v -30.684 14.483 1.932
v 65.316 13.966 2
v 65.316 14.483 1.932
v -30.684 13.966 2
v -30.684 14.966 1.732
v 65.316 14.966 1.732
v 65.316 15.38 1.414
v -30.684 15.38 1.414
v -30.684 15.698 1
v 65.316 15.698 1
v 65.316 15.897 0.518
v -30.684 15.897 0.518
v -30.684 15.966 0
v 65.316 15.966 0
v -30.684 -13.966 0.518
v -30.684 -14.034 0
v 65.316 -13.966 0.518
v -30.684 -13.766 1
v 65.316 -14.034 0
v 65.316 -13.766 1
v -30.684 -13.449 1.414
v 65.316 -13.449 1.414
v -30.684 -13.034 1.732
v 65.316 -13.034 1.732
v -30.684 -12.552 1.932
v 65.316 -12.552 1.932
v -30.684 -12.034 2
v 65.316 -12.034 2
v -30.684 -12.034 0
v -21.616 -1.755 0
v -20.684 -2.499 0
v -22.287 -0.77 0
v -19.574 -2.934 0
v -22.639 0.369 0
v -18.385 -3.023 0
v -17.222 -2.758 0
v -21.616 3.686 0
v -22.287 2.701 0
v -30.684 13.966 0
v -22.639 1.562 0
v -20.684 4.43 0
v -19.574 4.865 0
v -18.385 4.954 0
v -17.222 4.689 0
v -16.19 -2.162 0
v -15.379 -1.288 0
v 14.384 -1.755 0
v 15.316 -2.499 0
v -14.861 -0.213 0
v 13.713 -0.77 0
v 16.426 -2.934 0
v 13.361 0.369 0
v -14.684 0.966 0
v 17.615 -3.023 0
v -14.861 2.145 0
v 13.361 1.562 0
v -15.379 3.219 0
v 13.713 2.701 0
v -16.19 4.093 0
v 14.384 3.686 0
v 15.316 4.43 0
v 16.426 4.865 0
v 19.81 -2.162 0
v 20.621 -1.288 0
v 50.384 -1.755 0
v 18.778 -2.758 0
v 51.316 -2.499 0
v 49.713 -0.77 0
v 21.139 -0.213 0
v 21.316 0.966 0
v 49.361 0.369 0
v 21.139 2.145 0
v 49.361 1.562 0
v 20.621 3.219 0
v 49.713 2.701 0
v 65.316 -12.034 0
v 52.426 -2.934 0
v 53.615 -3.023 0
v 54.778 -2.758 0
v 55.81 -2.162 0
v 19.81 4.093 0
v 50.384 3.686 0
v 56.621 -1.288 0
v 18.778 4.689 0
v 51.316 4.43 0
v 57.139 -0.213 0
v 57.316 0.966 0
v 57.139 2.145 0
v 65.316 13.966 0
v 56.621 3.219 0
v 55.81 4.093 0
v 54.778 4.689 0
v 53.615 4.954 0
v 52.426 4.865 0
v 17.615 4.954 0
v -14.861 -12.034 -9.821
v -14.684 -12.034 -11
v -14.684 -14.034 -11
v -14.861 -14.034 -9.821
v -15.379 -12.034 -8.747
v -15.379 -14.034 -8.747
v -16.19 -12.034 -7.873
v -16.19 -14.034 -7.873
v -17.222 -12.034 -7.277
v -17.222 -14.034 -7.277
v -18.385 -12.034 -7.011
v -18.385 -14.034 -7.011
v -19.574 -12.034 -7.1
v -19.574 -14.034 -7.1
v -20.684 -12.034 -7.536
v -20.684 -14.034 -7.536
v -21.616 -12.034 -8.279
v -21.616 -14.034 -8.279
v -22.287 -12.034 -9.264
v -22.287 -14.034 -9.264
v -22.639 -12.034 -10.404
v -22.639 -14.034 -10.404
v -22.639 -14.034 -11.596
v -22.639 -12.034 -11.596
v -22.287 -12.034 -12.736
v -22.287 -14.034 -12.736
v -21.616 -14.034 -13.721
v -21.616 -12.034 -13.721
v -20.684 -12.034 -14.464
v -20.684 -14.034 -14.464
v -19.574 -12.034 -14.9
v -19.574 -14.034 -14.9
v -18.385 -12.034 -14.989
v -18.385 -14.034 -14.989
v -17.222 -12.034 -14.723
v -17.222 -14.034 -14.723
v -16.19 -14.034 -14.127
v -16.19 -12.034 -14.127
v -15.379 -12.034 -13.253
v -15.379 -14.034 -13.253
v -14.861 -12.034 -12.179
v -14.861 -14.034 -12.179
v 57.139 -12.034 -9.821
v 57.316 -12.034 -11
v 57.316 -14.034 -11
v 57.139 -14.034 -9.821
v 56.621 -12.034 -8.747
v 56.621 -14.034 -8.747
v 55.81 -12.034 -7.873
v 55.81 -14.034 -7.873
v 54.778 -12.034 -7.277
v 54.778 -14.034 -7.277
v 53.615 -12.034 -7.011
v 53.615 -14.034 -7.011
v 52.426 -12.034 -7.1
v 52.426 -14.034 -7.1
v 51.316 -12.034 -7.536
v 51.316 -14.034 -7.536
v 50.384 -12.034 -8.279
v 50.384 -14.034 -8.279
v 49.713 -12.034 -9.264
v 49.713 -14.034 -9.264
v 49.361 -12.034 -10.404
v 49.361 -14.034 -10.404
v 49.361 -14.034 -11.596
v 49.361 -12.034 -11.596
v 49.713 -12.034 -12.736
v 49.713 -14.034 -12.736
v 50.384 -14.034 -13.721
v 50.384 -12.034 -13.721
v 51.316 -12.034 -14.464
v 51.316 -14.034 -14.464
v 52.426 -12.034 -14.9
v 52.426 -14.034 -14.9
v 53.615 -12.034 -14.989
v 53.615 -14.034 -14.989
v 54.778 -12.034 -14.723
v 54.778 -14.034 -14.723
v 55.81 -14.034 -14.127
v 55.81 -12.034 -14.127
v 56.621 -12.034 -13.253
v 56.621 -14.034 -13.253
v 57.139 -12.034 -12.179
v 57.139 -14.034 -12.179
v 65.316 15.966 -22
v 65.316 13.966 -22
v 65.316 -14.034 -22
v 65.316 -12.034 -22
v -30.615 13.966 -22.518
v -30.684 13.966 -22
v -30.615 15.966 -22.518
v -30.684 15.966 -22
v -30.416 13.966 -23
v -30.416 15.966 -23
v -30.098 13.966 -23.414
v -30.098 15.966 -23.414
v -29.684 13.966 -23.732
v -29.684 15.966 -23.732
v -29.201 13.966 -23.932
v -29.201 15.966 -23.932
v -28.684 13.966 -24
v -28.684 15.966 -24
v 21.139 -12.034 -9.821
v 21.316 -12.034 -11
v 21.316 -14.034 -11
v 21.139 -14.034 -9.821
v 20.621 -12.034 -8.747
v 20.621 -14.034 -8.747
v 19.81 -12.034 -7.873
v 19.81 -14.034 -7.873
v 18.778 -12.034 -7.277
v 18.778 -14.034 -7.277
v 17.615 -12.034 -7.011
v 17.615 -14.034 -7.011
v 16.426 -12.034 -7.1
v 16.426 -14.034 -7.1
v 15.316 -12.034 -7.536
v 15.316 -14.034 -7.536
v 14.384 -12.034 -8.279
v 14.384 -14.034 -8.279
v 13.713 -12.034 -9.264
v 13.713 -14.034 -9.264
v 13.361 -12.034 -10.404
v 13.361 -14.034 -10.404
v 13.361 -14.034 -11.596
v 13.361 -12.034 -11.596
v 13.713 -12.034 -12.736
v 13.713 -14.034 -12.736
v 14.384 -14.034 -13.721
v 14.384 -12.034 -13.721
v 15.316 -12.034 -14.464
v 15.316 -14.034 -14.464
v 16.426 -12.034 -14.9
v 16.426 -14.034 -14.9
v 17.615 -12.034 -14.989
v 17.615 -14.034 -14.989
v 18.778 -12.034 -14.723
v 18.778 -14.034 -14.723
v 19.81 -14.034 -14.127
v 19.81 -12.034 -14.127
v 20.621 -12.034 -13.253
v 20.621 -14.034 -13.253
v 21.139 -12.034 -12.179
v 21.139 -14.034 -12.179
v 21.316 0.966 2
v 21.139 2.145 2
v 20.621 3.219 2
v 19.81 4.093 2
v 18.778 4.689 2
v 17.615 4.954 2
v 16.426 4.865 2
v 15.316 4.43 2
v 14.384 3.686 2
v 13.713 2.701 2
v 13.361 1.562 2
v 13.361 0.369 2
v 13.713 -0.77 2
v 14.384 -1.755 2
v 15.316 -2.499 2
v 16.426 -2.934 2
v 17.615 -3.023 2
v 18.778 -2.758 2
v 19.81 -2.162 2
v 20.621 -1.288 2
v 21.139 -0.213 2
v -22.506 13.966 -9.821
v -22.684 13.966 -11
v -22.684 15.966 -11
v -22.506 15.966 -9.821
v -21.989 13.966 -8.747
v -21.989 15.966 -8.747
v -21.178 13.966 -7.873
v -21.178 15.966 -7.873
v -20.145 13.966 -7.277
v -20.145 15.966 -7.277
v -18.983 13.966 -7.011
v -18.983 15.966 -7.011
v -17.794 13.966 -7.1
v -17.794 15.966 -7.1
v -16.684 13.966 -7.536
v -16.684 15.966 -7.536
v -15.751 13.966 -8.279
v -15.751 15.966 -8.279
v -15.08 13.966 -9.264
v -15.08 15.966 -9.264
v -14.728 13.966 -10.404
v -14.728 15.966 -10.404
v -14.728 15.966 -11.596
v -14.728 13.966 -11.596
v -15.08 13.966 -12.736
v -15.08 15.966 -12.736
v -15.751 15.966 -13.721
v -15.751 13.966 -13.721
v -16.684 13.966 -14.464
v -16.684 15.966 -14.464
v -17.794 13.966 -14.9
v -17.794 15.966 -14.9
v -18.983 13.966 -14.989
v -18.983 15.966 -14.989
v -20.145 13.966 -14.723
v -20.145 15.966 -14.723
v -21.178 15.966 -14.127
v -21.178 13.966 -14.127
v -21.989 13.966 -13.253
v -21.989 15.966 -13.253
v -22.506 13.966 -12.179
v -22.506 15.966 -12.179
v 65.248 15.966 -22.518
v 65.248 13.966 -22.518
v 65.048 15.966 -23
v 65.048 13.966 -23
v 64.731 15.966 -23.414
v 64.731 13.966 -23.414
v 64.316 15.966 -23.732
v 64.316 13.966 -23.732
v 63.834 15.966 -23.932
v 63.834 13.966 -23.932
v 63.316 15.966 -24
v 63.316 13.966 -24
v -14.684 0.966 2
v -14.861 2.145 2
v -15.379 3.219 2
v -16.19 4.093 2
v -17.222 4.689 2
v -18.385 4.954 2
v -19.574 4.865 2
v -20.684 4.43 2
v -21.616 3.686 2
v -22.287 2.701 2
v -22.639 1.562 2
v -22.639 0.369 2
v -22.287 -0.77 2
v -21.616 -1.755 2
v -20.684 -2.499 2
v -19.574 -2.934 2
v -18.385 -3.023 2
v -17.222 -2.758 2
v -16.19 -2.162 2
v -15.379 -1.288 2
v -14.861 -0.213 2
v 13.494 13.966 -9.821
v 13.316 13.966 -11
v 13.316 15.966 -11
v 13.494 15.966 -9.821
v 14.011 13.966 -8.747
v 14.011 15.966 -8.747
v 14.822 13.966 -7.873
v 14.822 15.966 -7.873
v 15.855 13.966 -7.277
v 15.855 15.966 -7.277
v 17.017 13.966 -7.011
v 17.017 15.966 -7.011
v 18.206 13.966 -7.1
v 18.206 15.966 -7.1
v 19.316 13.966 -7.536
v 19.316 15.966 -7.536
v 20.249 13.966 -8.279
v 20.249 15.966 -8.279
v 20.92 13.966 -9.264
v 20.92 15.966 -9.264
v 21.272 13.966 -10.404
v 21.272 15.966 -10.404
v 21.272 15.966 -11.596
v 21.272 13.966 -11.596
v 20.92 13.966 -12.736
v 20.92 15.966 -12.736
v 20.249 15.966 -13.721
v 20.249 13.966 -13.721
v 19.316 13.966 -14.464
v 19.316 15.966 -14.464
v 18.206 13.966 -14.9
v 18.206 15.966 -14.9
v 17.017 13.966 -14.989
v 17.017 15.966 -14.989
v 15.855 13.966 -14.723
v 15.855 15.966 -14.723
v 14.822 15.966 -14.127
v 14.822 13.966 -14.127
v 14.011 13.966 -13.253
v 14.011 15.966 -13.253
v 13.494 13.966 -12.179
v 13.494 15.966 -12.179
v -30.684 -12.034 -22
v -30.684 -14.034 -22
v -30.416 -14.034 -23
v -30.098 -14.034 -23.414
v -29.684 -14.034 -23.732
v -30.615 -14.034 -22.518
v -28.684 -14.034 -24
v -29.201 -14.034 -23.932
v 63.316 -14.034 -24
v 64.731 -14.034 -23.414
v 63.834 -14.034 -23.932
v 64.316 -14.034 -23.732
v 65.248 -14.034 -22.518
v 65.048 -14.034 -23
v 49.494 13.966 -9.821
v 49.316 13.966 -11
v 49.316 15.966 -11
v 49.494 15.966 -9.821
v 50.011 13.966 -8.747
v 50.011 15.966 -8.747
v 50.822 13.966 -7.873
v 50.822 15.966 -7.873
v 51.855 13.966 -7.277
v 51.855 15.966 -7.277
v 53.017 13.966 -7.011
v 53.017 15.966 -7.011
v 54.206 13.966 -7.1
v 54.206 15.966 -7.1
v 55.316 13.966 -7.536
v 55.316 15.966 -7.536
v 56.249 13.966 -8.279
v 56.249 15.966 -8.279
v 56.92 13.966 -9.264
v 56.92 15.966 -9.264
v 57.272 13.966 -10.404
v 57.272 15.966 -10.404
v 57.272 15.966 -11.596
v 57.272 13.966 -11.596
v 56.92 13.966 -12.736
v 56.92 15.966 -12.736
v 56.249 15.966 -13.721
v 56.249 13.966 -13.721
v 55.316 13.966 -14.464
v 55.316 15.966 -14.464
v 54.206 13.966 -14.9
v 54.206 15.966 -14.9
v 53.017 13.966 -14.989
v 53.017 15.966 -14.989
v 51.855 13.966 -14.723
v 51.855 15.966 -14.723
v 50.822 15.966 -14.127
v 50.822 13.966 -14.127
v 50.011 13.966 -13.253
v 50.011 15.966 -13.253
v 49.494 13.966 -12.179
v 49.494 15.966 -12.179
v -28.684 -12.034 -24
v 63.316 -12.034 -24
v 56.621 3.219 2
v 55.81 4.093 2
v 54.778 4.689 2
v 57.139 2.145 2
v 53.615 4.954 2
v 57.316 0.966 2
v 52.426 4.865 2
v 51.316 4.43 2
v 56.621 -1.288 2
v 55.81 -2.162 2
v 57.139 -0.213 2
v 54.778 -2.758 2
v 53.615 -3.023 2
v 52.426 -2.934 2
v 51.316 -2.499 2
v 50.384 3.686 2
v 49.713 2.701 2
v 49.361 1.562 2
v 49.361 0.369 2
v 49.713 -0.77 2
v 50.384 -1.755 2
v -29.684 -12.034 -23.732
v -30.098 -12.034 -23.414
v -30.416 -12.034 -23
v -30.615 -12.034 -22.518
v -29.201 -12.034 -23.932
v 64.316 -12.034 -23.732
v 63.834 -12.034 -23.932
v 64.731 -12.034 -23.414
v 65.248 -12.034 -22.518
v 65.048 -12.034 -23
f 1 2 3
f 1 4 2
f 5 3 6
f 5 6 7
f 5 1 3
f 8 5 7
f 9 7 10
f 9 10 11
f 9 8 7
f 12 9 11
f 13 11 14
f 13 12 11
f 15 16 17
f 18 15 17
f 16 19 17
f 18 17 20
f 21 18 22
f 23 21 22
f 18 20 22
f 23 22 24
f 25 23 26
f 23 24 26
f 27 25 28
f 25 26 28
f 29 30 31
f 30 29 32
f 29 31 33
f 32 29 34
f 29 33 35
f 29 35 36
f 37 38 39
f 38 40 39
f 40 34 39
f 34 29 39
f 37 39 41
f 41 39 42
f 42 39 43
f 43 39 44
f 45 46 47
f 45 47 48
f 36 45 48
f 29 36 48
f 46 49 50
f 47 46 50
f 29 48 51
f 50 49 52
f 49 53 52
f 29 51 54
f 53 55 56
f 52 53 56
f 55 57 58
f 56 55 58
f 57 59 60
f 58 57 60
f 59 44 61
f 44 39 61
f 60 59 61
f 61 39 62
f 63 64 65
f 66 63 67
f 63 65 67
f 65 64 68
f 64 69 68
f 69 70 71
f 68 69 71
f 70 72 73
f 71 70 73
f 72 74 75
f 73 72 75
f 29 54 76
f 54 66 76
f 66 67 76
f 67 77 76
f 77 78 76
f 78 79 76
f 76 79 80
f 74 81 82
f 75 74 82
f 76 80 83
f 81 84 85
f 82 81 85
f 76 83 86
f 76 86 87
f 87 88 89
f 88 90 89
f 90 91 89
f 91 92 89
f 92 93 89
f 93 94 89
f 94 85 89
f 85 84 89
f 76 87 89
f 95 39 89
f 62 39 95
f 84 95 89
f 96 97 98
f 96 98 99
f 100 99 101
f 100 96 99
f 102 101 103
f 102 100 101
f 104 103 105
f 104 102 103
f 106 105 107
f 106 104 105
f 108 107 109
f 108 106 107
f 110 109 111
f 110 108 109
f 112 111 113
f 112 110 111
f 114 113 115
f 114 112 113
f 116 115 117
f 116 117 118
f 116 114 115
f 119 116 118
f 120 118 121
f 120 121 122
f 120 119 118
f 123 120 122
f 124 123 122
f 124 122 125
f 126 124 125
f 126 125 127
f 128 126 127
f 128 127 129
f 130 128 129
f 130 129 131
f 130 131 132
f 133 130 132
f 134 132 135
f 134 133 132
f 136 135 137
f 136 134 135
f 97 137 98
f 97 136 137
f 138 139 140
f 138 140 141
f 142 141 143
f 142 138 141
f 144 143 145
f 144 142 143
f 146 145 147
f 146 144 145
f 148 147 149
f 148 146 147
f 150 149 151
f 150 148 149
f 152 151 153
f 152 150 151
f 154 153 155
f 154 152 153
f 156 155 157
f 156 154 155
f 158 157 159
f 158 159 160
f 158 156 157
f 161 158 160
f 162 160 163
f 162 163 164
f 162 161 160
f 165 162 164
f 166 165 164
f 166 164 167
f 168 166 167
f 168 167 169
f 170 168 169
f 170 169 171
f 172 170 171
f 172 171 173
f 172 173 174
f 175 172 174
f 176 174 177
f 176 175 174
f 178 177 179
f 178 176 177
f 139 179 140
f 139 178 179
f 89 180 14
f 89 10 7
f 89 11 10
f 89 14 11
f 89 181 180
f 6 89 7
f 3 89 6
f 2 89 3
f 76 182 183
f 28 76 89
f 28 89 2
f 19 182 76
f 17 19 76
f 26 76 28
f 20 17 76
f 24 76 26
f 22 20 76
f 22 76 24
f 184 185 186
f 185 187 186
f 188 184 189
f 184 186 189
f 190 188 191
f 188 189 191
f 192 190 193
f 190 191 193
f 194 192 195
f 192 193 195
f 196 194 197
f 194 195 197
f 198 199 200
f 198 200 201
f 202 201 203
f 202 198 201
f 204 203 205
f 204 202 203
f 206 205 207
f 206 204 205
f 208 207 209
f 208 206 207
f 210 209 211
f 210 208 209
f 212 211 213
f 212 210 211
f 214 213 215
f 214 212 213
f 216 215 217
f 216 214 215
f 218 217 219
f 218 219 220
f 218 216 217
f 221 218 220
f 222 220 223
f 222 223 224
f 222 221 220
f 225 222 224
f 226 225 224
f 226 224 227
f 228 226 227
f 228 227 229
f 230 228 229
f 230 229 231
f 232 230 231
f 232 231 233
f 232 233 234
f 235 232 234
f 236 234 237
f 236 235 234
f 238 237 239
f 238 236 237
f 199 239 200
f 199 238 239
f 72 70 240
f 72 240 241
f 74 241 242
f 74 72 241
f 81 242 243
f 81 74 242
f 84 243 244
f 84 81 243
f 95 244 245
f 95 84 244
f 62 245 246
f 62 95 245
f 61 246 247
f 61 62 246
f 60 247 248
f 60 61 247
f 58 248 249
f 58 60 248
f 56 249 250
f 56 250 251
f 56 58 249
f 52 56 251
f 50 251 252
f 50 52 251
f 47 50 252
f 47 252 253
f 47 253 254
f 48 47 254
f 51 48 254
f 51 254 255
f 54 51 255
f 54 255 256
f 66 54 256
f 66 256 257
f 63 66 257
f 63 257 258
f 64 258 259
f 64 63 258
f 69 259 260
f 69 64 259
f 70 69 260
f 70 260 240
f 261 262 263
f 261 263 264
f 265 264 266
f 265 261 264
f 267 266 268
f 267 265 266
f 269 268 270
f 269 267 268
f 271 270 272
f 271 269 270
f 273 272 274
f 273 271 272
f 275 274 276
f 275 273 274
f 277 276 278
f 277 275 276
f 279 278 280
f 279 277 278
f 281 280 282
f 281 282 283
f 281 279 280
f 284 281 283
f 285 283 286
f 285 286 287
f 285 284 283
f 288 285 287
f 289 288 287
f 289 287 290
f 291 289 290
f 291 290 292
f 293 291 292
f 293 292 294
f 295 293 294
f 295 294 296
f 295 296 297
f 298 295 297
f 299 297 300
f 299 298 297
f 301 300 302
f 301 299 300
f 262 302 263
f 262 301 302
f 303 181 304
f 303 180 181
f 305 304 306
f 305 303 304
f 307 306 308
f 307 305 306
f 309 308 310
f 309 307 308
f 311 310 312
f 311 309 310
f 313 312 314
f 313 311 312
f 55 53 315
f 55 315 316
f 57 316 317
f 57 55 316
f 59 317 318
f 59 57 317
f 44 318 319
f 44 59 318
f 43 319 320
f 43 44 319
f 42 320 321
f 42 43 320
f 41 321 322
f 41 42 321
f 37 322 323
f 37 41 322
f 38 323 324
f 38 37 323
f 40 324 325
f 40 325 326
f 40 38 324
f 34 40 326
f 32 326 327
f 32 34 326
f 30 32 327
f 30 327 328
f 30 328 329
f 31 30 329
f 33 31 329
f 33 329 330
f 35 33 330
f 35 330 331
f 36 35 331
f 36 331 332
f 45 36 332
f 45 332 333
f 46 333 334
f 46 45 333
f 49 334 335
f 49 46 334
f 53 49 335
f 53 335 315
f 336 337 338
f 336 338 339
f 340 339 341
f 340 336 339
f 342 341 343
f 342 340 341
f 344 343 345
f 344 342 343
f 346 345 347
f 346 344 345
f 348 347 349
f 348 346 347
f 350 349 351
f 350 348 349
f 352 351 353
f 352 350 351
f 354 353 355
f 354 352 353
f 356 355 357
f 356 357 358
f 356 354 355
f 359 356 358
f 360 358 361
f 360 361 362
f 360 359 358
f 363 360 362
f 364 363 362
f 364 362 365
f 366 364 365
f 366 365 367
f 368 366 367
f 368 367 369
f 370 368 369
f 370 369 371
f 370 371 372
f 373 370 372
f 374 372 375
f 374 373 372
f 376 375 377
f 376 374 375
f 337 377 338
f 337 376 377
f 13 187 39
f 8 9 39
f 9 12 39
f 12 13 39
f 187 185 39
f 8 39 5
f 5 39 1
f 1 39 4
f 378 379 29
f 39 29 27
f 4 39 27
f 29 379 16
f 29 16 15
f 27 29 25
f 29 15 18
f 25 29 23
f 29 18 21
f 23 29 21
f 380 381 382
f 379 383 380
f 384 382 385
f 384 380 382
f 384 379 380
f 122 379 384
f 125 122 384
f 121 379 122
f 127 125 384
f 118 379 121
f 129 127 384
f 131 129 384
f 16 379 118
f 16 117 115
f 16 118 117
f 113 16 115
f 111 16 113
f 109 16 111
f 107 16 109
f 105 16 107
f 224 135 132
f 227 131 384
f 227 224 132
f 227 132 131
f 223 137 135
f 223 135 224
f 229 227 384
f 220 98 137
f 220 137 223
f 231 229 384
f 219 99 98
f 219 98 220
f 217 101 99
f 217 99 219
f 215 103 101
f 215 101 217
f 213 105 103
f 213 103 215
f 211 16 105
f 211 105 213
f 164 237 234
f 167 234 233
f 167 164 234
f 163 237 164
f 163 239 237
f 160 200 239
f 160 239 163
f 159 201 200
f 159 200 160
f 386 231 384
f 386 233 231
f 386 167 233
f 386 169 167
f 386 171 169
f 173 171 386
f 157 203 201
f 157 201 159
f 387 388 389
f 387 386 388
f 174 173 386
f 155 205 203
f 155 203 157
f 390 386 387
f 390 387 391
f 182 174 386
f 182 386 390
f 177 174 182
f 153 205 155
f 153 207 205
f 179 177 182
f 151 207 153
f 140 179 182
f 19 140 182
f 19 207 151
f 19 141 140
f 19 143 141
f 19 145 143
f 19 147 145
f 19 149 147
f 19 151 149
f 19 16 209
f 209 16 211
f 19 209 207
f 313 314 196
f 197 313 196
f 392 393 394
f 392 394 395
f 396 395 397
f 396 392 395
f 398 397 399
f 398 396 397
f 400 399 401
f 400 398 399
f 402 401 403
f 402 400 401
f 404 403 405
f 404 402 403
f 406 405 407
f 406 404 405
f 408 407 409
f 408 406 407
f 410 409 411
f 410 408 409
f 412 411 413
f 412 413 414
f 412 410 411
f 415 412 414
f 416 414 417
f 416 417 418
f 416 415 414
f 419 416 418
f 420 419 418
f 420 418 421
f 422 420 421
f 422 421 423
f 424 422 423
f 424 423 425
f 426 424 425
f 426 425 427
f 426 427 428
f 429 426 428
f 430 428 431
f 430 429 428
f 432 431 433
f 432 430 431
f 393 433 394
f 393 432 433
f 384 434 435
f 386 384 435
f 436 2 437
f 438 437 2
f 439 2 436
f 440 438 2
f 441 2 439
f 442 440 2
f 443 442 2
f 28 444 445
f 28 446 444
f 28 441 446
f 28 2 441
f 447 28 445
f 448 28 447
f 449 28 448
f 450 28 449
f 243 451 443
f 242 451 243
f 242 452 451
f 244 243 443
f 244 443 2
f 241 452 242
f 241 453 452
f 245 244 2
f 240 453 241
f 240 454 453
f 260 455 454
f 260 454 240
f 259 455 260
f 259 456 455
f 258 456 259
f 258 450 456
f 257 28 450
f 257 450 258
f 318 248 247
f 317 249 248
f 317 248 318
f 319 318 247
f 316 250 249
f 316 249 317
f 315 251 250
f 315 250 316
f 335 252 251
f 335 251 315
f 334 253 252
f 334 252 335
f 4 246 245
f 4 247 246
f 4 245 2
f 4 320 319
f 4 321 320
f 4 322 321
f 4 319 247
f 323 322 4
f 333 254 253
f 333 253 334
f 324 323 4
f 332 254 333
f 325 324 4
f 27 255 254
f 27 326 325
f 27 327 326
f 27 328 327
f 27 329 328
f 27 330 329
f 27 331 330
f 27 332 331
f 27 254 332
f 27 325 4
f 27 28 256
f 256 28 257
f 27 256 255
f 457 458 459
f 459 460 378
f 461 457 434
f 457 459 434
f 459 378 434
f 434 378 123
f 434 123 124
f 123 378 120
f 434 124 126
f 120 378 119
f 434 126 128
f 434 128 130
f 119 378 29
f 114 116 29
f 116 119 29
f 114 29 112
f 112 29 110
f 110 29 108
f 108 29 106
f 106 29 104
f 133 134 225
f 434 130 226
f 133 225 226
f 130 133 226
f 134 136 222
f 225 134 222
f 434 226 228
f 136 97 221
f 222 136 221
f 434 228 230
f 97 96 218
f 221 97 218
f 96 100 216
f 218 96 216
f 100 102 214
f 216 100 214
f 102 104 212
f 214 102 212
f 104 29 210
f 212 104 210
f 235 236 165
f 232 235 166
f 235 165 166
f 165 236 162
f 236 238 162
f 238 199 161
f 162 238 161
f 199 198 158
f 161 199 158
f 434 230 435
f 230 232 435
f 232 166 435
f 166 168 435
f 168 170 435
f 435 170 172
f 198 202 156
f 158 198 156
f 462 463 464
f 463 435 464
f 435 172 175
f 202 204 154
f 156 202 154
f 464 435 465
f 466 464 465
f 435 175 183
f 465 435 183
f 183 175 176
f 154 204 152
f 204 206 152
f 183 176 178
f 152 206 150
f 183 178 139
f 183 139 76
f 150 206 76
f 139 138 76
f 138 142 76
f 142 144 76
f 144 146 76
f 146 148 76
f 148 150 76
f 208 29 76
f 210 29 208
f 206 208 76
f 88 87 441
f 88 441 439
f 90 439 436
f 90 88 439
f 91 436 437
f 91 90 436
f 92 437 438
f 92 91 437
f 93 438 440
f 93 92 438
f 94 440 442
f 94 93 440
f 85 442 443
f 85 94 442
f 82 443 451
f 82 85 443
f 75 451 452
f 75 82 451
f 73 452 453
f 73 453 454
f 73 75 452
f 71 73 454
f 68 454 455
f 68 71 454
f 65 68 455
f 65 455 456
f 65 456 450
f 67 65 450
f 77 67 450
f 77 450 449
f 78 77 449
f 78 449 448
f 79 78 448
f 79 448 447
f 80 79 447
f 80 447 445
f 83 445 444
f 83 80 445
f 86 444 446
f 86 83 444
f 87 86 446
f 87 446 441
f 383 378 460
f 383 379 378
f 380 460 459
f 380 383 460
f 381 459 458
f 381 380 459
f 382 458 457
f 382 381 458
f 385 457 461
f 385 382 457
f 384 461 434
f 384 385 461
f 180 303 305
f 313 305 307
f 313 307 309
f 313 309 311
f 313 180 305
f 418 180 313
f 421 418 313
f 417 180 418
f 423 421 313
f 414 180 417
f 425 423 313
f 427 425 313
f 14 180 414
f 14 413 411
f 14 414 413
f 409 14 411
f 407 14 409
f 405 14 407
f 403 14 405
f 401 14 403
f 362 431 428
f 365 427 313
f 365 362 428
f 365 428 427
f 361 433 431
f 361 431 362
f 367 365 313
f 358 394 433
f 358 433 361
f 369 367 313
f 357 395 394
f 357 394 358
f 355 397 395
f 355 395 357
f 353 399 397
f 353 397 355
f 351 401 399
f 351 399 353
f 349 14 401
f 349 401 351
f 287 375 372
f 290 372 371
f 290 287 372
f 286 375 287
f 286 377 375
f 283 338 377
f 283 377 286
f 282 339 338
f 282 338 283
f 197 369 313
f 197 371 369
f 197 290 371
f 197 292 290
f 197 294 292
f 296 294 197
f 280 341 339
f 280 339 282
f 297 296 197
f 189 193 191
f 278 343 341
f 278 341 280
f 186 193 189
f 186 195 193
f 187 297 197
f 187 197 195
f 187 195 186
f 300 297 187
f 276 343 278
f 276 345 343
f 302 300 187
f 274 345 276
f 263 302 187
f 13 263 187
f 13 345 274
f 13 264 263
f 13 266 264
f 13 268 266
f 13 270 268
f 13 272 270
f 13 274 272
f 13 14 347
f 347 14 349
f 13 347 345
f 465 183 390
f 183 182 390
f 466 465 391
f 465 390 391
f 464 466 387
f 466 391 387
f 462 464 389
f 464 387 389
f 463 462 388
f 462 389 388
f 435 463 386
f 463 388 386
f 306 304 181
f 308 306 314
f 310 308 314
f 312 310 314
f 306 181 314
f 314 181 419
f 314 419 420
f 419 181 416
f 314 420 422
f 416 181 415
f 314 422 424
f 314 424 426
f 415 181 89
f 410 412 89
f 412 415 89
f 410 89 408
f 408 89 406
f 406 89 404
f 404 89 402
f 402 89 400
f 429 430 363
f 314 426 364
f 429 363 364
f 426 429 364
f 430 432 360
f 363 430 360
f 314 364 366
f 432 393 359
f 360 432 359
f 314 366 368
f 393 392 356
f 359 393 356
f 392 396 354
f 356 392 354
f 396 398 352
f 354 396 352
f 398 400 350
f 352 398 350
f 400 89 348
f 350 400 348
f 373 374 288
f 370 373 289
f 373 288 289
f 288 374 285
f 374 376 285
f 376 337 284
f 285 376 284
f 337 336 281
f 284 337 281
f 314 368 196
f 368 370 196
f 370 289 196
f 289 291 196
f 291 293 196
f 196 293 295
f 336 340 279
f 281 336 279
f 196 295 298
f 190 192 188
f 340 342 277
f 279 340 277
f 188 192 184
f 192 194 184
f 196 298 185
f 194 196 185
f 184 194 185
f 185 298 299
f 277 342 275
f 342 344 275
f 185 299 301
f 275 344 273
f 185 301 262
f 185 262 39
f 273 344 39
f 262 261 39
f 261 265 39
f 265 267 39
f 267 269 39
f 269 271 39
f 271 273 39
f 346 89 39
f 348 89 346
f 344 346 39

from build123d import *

# Parameters (mm, degrees)
F0_W     = 96
F0_H     = 26
F0_R     = 4
F1_DEPTH = 2
F5_W     = 96
F5_H     = 26
F5_R     = 4
F6_DEPTH = 2
F4_W     = 96
F4_H     = 26
F4_R     = 4
F7_DEPTH = 2
F8_R     = 2


with BuildPart() as f1:
    # F0 (on Top) → F1 (new body)
    with BuildSketch(Plane.XY):
        with Locations((17.3164154523, 0.965568237)):
            Rectangle(F0_W, F0_H)
        with Locations((17.3164154523, 0.965568237)):
            Circle(F0_R, mode=Mode.SUBTRACT)
        with Locations((-18.6835845477, 0.965568237)):
            Circle(F0_R, mode=Mode.SUBTRACT)
        with Locations((53.3164154523, 0.965568237)):
            Circle(F0_R, mode=Mode.SUBTRACT)
    extrude(amount=F1_DEPTH)

    # F5 (on offset) → F6 (join)
    with BuildSketch(Plane.XZ.offset(12.034431763)):
        with Locations((17.3164154523, -11)):
            Rectangle(F5_W, F5_H)
        with Locations((-18.6835845477, -11)):
            Circle(F5_R, mode=Mode.SUBTRACT)
        with Locations((17.3164154523, -11)):
            Circle(F5_R, mode=Mode.SUBTRACT)
        with Locations((53.3164154523, -11)):
            Circle(F5_R, mode=Mode.SUBTRACT)
    extrude(amount=F6_DEPTH)

    # F4 (on offset) → F7 (join)
    with BuildSketch(Plane(origin=(0, 13.965568237, 0), x_dir=(-1, 0, 0), z_dir=(0, 1, 0))):
        with Locations((-17.3164154523, -11)):
            Rectangle(F4_W, F4_H)
        with Locations((-53.3164154523, -11)):
            Circle(F4_R, mode=Mode.SUBTRACT)
        with Locations((-17.3164154523, -11)):
            Circle(F4_R, mode=Mode.SUBTRACT)
        with Locations((18.6835845477, -11)):
            Circle(F4_R, mode=Mode.SUBTRACT)
    extrude(amount=F7_DEPTH)

    # F8
    f8_edges = [f1.edges().sort_by_distance(p)[0] for p in [
        (17.316415, -14.034432, 2),
        (17.316415, 15.965568, 2),
        (65.316415, 14.965568, -24),
        (65.316415, -13.034432, -24),
        (-30.683585, 14.965568, -24),
        (-30.683585, -13.034432, -24),
    ]]
    fillet(f8_edges, radius=F8_R)


solid = f1.part
